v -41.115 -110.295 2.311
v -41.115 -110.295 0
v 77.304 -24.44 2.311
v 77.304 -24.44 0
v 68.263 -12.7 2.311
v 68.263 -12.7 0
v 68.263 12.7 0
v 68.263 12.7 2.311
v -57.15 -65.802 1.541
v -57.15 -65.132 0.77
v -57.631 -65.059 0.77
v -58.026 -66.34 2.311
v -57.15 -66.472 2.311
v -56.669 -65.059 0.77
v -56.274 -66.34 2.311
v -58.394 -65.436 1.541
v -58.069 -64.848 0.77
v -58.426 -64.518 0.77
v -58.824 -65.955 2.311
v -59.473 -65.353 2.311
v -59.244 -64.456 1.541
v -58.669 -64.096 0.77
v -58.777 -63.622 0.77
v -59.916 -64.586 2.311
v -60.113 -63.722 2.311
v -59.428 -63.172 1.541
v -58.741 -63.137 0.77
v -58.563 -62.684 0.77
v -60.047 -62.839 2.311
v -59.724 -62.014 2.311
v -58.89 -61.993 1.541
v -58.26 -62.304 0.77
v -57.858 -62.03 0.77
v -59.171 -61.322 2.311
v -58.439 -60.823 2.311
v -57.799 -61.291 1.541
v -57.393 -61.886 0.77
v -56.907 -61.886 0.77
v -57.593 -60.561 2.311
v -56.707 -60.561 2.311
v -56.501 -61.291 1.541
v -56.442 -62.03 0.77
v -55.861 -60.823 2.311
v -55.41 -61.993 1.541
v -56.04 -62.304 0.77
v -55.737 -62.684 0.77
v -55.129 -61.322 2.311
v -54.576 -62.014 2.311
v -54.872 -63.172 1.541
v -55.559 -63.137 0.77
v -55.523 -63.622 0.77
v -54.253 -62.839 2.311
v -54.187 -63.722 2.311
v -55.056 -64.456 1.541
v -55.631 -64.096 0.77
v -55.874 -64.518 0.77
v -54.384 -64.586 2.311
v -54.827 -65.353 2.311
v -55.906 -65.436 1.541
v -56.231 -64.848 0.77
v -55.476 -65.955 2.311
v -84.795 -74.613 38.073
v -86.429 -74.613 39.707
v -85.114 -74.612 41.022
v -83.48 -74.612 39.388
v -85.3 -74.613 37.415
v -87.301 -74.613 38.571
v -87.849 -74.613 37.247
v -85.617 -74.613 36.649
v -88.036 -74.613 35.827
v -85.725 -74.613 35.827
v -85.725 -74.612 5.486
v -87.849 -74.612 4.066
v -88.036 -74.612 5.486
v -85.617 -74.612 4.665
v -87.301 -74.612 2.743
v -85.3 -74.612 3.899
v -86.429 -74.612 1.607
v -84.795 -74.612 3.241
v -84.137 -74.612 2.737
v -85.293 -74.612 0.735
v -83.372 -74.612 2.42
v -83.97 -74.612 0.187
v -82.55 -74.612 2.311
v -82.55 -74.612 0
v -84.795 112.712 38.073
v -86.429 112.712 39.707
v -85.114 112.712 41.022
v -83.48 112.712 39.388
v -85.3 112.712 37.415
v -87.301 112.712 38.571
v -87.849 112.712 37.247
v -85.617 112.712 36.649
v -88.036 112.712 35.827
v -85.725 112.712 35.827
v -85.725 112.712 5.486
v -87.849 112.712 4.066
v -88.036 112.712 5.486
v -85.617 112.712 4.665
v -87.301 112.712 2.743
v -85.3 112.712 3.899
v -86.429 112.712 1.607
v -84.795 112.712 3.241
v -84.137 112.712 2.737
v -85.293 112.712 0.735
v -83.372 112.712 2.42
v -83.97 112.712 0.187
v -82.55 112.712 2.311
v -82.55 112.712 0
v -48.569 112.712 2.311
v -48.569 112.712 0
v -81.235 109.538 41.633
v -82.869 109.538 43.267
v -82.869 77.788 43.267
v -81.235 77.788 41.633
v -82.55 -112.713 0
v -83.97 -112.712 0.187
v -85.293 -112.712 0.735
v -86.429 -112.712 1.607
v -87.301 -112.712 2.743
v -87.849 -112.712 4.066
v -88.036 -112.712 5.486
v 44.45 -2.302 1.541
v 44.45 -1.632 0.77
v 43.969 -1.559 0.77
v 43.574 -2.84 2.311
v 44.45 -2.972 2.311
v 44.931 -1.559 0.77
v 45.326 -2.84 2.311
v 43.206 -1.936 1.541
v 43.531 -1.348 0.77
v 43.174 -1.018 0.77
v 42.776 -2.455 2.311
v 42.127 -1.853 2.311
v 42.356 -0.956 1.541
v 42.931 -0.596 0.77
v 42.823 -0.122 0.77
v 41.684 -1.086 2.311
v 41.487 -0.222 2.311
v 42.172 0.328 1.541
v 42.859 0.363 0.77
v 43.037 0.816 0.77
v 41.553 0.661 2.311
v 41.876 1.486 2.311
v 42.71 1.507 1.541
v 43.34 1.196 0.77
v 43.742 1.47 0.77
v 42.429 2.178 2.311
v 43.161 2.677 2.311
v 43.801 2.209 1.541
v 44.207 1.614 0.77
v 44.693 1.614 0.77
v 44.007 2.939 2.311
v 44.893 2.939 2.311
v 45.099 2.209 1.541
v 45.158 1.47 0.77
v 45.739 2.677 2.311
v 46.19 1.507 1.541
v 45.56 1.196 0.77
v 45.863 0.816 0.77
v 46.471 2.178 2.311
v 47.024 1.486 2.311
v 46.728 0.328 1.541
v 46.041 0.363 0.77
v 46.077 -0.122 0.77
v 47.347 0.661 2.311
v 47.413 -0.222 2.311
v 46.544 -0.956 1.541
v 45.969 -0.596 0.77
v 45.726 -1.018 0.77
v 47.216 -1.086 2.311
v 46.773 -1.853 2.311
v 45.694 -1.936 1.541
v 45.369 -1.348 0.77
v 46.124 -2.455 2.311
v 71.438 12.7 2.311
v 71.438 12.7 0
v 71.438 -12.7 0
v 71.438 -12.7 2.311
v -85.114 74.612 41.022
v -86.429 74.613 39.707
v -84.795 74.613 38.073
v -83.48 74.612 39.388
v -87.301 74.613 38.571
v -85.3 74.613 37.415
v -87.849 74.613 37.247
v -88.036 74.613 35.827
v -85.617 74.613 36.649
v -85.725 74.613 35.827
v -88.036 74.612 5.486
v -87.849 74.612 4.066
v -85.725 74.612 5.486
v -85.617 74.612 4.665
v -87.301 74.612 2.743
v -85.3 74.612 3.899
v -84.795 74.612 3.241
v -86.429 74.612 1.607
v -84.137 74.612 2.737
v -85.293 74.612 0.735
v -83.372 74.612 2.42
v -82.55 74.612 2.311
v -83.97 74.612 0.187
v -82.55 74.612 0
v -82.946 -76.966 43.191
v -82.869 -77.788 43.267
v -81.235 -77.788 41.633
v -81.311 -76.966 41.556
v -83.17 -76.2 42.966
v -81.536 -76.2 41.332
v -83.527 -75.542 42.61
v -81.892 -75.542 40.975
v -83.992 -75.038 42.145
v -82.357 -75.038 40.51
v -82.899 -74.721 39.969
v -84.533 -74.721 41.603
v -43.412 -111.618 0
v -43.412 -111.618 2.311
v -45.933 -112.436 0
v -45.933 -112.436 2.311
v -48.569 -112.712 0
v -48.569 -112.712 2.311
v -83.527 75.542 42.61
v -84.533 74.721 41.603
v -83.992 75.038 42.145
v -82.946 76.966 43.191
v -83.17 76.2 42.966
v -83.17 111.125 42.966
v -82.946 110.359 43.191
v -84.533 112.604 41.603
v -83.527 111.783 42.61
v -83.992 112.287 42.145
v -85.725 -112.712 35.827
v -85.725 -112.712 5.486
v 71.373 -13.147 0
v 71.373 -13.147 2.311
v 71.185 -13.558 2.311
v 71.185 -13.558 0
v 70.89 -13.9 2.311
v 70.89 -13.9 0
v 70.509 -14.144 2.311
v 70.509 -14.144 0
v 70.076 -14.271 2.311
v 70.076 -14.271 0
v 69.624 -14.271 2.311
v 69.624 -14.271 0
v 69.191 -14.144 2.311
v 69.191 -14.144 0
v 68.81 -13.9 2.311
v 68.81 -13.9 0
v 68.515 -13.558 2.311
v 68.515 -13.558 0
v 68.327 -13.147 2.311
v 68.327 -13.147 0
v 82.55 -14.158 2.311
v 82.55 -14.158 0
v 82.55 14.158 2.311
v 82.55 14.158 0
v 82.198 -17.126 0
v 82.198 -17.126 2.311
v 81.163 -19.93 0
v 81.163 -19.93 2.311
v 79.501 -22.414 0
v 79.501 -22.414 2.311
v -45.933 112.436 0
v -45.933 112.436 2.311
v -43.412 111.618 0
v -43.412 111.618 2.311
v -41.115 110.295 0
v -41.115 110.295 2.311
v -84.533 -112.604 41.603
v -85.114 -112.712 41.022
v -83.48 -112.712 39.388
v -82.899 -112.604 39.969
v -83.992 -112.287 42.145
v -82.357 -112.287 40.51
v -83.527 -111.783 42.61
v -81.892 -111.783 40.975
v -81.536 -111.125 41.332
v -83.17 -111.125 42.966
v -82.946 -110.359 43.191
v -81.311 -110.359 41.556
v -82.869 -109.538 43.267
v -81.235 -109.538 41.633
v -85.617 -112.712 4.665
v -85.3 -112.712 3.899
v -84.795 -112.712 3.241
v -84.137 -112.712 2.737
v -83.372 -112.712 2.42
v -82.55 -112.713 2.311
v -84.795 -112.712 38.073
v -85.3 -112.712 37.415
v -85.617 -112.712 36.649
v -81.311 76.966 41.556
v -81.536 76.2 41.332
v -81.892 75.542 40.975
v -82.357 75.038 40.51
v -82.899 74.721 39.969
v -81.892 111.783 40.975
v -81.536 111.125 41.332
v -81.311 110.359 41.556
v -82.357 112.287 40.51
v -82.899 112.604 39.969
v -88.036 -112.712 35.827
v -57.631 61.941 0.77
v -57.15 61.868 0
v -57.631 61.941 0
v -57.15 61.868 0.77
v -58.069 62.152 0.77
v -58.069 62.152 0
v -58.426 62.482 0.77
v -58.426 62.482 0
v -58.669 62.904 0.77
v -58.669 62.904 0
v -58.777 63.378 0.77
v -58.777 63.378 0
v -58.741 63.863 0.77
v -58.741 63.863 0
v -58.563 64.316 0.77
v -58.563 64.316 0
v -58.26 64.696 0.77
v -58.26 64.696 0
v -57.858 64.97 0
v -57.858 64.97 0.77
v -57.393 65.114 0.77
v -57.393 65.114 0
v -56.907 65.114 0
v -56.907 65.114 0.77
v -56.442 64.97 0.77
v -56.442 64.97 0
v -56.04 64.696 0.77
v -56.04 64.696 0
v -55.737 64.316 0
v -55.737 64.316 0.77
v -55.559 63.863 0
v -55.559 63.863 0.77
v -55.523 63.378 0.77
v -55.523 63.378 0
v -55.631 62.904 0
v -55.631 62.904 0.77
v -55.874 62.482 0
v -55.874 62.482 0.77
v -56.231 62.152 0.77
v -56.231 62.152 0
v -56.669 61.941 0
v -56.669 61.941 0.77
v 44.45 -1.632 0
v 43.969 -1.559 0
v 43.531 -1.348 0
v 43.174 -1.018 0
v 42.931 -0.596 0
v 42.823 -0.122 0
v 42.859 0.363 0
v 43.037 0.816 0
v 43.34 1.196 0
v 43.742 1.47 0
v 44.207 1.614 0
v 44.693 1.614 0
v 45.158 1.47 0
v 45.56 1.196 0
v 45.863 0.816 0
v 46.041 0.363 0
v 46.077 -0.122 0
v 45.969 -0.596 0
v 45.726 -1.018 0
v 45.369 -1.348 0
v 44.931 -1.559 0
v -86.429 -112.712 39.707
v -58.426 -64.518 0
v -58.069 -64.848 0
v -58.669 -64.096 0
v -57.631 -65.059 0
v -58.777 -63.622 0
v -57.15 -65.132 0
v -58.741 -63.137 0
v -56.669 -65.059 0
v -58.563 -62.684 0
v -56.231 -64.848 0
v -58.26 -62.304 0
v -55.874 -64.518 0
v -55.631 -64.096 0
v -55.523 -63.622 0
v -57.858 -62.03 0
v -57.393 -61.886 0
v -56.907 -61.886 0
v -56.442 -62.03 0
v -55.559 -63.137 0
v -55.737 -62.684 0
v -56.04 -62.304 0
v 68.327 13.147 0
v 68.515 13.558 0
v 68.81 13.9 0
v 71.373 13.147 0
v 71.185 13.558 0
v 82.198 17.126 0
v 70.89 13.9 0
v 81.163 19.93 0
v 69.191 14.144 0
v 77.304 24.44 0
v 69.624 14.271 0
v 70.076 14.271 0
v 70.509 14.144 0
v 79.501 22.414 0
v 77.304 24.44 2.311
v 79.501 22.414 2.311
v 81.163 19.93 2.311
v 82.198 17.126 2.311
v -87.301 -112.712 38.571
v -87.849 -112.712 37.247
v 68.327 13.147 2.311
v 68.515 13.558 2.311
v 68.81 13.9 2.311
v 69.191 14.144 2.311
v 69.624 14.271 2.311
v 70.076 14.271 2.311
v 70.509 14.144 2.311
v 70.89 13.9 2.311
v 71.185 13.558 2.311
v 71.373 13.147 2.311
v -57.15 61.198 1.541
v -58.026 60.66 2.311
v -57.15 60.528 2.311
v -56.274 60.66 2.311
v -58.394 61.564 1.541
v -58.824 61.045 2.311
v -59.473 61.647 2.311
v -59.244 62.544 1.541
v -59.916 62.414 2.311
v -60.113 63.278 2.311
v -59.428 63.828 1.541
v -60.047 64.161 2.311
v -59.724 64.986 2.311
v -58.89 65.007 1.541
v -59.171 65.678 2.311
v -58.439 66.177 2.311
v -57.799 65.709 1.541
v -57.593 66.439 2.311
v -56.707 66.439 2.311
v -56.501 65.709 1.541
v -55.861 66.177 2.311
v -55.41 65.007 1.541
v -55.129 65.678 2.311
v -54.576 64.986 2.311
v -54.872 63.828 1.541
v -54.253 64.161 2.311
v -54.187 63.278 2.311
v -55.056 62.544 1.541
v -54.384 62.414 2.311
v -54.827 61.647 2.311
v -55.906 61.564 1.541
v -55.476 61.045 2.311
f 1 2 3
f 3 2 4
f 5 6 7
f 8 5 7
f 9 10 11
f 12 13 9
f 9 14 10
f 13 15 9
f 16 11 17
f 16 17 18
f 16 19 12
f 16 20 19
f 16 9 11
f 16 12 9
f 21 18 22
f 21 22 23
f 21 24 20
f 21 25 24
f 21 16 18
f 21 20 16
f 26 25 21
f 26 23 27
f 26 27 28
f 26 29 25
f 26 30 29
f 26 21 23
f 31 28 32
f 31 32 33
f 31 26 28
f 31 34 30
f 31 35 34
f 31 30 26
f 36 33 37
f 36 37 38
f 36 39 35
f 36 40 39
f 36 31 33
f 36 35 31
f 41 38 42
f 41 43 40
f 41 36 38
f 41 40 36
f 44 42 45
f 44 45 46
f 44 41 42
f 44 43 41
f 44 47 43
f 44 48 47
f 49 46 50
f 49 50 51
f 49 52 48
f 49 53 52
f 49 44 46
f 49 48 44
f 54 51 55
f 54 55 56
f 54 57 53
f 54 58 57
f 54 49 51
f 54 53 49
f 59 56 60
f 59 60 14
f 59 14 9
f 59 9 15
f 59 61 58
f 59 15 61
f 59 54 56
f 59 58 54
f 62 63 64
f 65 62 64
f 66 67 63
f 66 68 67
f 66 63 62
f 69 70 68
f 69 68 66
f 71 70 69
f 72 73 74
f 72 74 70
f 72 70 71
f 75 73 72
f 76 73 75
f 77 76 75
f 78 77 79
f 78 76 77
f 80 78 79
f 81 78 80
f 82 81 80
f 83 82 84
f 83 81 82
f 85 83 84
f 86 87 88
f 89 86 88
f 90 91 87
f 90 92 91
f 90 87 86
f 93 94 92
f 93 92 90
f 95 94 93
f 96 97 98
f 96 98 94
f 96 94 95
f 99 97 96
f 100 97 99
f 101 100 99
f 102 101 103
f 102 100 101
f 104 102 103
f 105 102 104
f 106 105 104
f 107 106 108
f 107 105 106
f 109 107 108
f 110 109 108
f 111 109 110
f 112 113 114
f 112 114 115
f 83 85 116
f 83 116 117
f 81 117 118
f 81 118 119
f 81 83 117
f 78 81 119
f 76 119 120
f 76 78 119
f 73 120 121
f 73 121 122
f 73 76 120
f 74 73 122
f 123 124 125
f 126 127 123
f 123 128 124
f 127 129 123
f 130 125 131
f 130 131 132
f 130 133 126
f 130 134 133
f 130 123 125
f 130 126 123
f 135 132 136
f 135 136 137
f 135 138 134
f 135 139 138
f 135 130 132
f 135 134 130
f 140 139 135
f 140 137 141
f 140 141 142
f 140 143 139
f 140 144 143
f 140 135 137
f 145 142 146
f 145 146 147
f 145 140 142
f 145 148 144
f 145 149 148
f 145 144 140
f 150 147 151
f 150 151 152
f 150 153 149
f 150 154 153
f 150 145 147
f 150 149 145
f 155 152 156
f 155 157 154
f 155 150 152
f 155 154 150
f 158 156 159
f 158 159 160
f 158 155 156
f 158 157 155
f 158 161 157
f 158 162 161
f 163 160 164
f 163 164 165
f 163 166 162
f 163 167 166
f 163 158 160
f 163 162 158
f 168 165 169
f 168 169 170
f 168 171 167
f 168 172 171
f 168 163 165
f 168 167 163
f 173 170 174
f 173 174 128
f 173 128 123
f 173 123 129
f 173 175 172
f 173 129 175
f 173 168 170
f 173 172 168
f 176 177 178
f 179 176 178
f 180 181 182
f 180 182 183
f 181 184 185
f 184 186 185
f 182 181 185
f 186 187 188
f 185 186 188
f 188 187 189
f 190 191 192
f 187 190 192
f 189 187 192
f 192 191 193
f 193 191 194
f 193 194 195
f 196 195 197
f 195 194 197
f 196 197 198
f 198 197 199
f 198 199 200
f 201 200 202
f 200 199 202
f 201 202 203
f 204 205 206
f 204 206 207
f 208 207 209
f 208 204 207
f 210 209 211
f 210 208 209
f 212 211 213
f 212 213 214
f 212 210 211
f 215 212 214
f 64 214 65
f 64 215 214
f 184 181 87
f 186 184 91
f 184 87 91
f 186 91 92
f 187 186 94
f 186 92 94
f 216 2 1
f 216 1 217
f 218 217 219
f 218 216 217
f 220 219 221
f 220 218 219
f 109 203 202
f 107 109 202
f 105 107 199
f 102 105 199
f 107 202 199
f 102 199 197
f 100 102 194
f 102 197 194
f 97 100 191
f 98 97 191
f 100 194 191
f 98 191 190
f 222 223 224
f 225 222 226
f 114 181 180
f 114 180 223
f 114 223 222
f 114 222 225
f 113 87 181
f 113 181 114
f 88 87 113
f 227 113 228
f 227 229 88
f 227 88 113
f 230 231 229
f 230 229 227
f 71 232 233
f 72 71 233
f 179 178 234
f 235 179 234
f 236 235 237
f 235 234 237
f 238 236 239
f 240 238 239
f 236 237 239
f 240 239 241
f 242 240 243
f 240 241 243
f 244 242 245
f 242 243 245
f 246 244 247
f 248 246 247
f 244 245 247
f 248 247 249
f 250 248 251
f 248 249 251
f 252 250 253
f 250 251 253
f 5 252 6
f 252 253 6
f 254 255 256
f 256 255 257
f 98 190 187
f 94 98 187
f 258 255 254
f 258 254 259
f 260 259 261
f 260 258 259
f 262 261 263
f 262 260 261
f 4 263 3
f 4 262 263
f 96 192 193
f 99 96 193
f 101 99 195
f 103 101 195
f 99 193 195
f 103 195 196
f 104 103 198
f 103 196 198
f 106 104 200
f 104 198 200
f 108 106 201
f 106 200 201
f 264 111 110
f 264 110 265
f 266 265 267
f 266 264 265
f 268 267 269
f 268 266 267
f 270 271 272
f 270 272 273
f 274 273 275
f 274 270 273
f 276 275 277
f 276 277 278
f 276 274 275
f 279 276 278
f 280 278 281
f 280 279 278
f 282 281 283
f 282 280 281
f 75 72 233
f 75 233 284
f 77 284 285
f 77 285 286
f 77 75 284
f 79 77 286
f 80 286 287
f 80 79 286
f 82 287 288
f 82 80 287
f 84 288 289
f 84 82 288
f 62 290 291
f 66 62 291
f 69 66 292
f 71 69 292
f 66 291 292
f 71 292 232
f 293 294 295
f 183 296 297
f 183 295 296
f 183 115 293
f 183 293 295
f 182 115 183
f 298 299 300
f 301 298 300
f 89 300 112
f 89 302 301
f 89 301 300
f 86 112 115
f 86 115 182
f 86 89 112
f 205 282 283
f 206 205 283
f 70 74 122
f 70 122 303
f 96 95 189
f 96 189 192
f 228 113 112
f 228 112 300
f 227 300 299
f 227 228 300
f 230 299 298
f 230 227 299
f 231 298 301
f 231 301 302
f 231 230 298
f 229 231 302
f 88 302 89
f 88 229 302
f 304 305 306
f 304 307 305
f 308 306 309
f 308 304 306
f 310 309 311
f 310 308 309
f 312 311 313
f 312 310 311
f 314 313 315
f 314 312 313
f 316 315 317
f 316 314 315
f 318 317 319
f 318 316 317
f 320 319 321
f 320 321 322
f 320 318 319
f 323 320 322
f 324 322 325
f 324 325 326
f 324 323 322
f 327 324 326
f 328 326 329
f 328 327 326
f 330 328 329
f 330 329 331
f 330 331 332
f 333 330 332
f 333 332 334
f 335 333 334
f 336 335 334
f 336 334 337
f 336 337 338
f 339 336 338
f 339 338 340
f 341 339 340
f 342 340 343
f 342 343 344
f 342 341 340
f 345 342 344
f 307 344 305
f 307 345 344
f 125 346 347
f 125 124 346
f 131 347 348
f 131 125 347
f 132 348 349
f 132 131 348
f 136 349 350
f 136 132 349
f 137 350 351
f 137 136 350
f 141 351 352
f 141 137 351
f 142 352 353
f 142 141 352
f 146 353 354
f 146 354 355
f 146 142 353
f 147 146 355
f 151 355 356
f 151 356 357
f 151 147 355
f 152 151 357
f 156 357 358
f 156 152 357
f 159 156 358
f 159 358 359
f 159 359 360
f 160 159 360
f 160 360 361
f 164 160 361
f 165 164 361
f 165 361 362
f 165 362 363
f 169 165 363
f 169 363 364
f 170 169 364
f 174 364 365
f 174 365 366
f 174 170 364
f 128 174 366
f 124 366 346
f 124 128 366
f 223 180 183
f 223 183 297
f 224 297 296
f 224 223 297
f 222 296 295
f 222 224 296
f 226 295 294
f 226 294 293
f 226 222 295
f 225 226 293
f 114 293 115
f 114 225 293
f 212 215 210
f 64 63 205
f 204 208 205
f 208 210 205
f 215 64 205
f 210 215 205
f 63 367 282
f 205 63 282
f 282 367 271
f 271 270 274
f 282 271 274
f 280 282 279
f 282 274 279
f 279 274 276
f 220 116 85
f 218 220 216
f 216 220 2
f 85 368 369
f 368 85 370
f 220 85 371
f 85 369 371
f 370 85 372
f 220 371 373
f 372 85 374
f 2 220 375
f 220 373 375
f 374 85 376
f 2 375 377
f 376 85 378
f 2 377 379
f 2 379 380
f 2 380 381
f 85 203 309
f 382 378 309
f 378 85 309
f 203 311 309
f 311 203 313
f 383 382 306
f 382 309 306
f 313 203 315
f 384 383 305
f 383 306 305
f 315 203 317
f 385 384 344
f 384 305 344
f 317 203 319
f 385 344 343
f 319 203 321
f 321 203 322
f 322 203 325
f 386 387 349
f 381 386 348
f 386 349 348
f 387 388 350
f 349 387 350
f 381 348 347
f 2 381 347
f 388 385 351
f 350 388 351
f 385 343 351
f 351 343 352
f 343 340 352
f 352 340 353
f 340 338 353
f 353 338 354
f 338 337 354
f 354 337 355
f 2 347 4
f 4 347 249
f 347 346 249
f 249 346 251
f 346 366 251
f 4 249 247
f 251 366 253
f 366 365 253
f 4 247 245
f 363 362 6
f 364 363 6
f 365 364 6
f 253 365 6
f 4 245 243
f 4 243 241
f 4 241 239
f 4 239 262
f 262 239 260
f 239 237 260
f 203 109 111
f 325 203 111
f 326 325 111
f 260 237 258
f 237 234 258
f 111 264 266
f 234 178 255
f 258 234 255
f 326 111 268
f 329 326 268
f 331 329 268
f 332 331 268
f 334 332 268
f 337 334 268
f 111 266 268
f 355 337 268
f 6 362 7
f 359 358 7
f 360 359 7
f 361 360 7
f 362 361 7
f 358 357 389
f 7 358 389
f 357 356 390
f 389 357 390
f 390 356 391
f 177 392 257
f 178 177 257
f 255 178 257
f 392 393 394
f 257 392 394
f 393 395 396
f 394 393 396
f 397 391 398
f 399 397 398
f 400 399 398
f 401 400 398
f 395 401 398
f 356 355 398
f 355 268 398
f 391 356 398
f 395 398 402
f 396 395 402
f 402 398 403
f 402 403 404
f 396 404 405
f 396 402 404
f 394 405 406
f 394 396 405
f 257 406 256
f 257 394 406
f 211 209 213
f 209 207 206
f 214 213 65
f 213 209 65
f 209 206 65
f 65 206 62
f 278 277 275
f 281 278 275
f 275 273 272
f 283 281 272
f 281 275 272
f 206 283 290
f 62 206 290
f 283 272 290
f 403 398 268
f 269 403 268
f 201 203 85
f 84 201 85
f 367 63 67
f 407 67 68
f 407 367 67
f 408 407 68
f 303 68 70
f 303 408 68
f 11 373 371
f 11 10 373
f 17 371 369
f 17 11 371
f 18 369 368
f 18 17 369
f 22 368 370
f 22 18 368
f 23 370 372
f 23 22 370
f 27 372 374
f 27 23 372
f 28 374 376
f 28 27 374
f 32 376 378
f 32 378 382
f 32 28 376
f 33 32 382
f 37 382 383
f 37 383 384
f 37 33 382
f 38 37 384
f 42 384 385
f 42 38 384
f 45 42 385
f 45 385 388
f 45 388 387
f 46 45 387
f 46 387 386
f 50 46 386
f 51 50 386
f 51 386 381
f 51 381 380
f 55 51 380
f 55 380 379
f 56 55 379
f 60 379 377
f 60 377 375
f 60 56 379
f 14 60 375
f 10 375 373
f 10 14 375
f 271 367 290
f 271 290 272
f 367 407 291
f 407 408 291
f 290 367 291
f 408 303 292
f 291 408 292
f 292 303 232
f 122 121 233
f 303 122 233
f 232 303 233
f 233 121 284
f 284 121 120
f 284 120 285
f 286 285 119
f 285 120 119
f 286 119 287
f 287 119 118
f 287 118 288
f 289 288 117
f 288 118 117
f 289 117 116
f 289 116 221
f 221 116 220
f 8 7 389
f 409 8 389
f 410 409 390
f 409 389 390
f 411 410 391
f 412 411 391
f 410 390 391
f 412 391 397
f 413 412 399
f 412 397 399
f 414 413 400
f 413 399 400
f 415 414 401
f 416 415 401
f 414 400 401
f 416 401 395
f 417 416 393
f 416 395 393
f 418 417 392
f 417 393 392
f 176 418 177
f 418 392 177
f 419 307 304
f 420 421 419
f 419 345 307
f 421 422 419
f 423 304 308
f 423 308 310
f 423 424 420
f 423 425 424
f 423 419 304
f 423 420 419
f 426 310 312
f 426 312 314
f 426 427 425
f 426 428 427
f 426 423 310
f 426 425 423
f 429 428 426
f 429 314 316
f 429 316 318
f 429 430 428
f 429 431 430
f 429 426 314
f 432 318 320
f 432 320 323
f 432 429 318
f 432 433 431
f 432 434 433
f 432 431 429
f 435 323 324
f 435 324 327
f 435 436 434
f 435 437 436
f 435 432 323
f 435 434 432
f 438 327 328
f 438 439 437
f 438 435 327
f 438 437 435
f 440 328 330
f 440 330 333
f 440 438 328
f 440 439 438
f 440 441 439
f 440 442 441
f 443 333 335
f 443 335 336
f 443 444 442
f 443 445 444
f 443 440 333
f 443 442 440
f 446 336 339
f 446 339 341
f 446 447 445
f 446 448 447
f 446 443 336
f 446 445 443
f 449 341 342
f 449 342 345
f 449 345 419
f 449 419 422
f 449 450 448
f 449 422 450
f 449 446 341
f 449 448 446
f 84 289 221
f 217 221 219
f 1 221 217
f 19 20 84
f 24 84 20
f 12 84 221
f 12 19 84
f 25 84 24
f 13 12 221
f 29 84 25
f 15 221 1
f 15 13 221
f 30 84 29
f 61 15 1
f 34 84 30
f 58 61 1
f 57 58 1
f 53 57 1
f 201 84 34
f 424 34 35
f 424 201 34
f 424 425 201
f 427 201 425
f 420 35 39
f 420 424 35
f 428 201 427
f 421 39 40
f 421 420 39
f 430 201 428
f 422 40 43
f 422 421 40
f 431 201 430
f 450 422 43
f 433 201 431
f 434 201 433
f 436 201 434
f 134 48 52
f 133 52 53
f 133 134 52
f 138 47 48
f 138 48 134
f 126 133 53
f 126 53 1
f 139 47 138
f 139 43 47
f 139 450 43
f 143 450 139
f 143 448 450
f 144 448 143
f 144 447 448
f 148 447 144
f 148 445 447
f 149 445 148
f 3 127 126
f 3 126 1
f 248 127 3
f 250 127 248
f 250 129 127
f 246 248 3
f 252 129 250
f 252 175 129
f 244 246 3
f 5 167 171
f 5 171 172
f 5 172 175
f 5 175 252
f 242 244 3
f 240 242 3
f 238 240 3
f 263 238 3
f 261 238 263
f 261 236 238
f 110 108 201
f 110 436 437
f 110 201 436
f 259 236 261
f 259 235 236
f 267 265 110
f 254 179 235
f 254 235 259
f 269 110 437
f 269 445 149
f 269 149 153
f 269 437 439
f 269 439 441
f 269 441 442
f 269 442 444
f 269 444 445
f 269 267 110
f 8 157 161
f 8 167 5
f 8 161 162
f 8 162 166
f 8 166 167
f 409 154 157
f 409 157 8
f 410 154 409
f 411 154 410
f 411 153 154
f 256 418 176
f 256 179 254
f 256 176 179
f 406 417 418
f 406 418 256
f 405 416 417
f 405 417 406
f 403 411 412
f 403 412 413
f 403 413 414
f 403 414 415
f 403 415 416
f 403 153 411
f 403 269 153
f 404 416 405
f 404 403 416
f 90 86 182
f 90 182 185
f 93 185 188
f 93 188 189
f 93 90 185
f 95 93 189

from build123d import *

# Parameters (mm, degrees)
BASE_FLANGE1_DEPTH                    = 2.3114
EDGE_FLANGE2_DEPTH                    = 38.1
EDGE_FLANGE3_START                    = -112.7125
EDGE_FLANGE3_DEPTH                    = 38.1
EDGE_FLANGE3_2_DEPTH                  = 38.1
CUT_EXTRUDE1_DEPTH                    = 149.767894723
CUT_EXTRUDE1_DEPTH_BACK               = 149.767894723
BREAK_CORNER1_START                   = -89.191903794
BREAK_CORNER1_DEPTH                   = 2.3114
BREAK_CORNER2_DEPTH                   = 2.3114
F_30_0_1285_DIAMETER_HOLE1_AT_2_COUNT = 2
F_30_0_1285_DIAMETER_HOLE1_AT_2_PITCH = 127
F_30_0_1285_DIAMETER_HOLE1_AT_3_COUNT = 2
F_30_0_1285_DIAMETER_HOLE1_AT_3_PITCH = 119.811560377


# Read off the part's stored shape, not the designer's step: Edge-Flange3, Break-Corner1, Break-Corner2
# Sheet-metal steps are written as plain solids
with BuildPart() as part:
    # Sketch1 → Base-Flange1 (new body)
    with BuildSketch(Plane.XY):
        Polygon((-82.55, 112.7125), (-82.55, -112.7125), (-44.45, -112.7125), (82.55, -20.6375), (82.55, 20.6375), (-44.45, 112.7125), align=None)
    extrude(amount=BASE_FLANGE1_DEPTH)

    # Edge-Flange2 section (across the edge) → Edge-Flange2 (add)
    with BuildSketch(Plane(origin=(-85.725, -74.6125, 2.3114), x_dir=(1, 0, 0), z_dir=(0, -1, 0))):
        with BuildLine():
            Line((-2.3114, 3.175), (-2.3114, 38.1))
            Line((-2.3114, 38.1), (0, 38.1))
            Line((0, 38.1), (0, 3.175))
            ThreePointArc((0, 3.175), (0.92993597, 0.92993597), (3.175, 0))
            Line((3.175, 0), (3.175, -2.3114))
            ThreePointArc((3.175, -2.3114), (-0.704470644, -0.704470644), (-2.3114, 3.175))
        make_face()
    edge_flange2 = extrude(amount=EDGE_FLANGE2_DEPTH)

    # Mirror1: Edge-Flange2 across plane
    add(edge_flange2.mirror(Plane.ZX))

    # Edge-Flange3 outline → Edge-Flange3 (cut)
    with BuildSketch(Plane(origin=(0, 0, 0), x_dir=(1, 0, 0), z_dir=(0, 1, 0)).offset(EDGE_FLANGE3_START)):
        with BuildLine():
            Line((-85.725, -40.4114), (-86.429470644, -39.706929356))
            ThreePointArc((-86.429470644, -39.706929356), (-87.618772667, -37.927013095), (-88.0364, -35.827458711))
            Line((-88.0364, -35.827458711), (-88.0364, -40.4114))
            Line((-88.0364, -40.4114), (-85.725, -40.4114))
        make_face()
    edge_flange3 = extrude(amount=EDGE_FLANGE3_DEPTH, mode=Mode.SUBTRACT)

    # Edge-Flange3 2 outline → Edge-Flange3 2 (add)
    with BuildSketch(Plane(origin=(0, 0, 0), x_dir=(1, 0, 0), z_dir=(0, 1, 0)).offset(EDGE_FLANGE3_START)):
        with BuildLine():
            Line((-85.725, -35.827458711), (-85.725, -40.4114))
            Line((-85.725, -40.4114), (-82.869278554, -43.267121446))
            Line((-82.869278554, -43.267121446), (-81.234871939, -41.632714832))
            Line((-81.234871939, -41.632714832), (-84.79506403, -38.072522742))
            ThreePointArc((-84.79506403, -38.072522742), (-85.483317516, -37.042478609), (-85.725, -35.827458711))
        make_face()
    edge_flange3_2 = extrude(amount=EDGE_FLANGE3_2_DEPTH)

    # Mirror2: Edge-Flange3, Edge-Flange3 2 across plane
    add(edge_flange3.mirror(Plane.ZX), mode=Mode.SUBTRACT)
    add(edge_flange3_2.mirror(Plane.ZX))

    # Sketch15 → Cut-Extrude1 (cut, two sides: drawn at the far end of the back side and taken through both)
    with BuildSketch(Plane.XY.offset(2.3114).offset(-CUT_EXTRUDE1_DEPTH_BACK)):
        with BuildLine():
            Line((71.4375, 12.7), (71.4375, -12.7))
            ThreePointArc((71.4375, -12.7), (69.85, -14.2875), (68.2625, -12.7))
            Line((68.2625, -12.7), (68.2625, 12.7))
            ThreePointArc((68.2625, 12.7), (69.85, 14.2875), (71.4375, 12.7))
        make_face()
    extrude(amount=CUT_EXTRUDE1_DEPTH + CUT_EXTRUDE1_DEPTH_BACK, mode=Mode.SUBTRACT)

    # Break-Corner1 outline → Break-Corner1 (cut)
    with BuildSketch(Plane(origin=(0, 0, 0), x_dir=(0.707106781186541, 0, 0.707106781186554), z_dir=(0.707106781186554, 0, -0.707106781186541)).offset(BREAK_CORNER1_START)):
        with BuildLine():
            Line((-28.00295384, 74.6125), (-28.00295384, 77.7875))
            ThreePointArc((-28.00295384, 77.7875), (-28.93288981, 75.54243597), (-31.17795384, 74.6125))
            Line((-31.17795384, 74.6125), (-28.00295384, 74.6125))
        make_face()
        with BuildLine():
            ThreePointArc((-31.17795384, 112.7125), (-28.93288981, 111.78256403), (-28.00295384, 109.5375))
            Line((-28.00295384, 109.5375), (-28.00295384, 112.7125))
            Line((-28.00295384, 112.7125), (-31.17795384, 112.7125))
        make_face()
        with BuildLine():
            ThreePointArc((-31.17795384, -74.6125), (-28.93288981, -75.54243597), (-28.00295384, -77.7875))
            Line((-28.00295384, -77.7875), (-28.00295384, -74.6125))
            Line((-28.00295384, -74.6125), (-31.17795384, -74.6125))
        make_face()
        with BuildLine():
            ThreePointArc((-28.00295384, -109.5375), (-28.93288981, -111.78256403), (-31.17795384, -112.7125))
            Line((-31.17795384, -112.7125), (-28.00295384, -112.7125))
            Line((-28.00295384, -112.7125), (-28.00295384, -109.5375))
        make_face()
    extrude(amount=BREAK_CORNER1_DEPTH, mode=Mode.SUBTRACT)

    # Break-Corner2 outline → Break-Corner2 (cut)
    with BuildSketch(Plane.XY):
        with BuildLine():
            Line((-44.45, 112.7125), (-48.569388338, 112.7125))
            ThreePointArc((-48.569388338, 112.7125), (-44.650974655, 112.09289876), (-41.114900181, 110.294552631))
            Line((-41.114900181, 110.294552631), (-44.45, 112.7125))
        make_face()
        with BuildLine():
            Line((-44.45, -112.7125), (-41.114900181, -110.294552631))
            ThreePointArc((-41.114900181, -110.294552631), (-44.650974655, -112.09289876), (-48.569388338, -112.7125))
            Line((-48.569388338, -112.7125), (-44.45, -112.7125))
        make_face()
        with BuildLine():
            Line((82.55, -20.6375), (82.55, -14.158443455))
            ThreePointArc((82.55, -14.158443455), (81.16286877, -19.929838451), (77.304488158, -24.440496086))
            Line((77.304488158, -24.440496086), (82.55, -20.6375))
        make_face()
        with BuildLine():
            Line((82.55, 20.6375), (77.304488158, 24.440496086))
            ThreePointArc((77.304488158, 24.440496086), (81.16286877, 19.929838451), (82.55, 14.158443455))
            Line((82.55, 14.158443455), (82.55, 20.6375))
        make_face()
    extrude(amount=BREAK_CORNER2_DEPTH, mode=Mode.SUBTRACT)

    # Sketch18 → #30 (0.1285) Diameter Hole1 (revolve, cut)
    with BuildSketch(Plane(origin=(-57.15, -63.5, 2.3114), x_dir=(0, -1, 0), z_dir=(1, 0, 0))):
        Polygon((0, 0), (0, 2.3114), (1.63195, 2.3114), (1.63195, 1.54132111), (2.9718, 0), align=None)
    f_30_0_1285_diameter_hole1 = revolve(axis=Axis((-57.15, -63.5, 8.6614), (0, 0, -1)), mode=Mode.SUBTRACT)

    # #30 (0.1285) Diameter Hole1 at 2: #30 (0.1285) Diameter Hole1 ×2
    with Locations(*[(0, i * F_30_0_1285_DIAMETER_HOLE1_AT_2_PITCH, 0) for i in range(1, F_30_0_1285_DIAMETER_HOLE1_AT_2_COUNT)]):
        add(f_30_0_1285_diameter_hole1, mode=Mode.SUBTRACT)

    # #30 (0.1285) Diameter Hole1 at 3: #30 (0.1285) Diameter Hole1 ×2
    with Locations(*[Vector(0.8479983040050879, 0.52999894000318, 0) * (i * F_30_0_1285_DIAMETER_HOLE1_AT_3_PITCH) for i in range(1, F_30_0_1285_DIAMETER_HOLE1_AT_3_COUNT)]):
        add(f_30_0_1285_diameter_hole1, mode=Mode.SUBTRACT)


solid = part.part
